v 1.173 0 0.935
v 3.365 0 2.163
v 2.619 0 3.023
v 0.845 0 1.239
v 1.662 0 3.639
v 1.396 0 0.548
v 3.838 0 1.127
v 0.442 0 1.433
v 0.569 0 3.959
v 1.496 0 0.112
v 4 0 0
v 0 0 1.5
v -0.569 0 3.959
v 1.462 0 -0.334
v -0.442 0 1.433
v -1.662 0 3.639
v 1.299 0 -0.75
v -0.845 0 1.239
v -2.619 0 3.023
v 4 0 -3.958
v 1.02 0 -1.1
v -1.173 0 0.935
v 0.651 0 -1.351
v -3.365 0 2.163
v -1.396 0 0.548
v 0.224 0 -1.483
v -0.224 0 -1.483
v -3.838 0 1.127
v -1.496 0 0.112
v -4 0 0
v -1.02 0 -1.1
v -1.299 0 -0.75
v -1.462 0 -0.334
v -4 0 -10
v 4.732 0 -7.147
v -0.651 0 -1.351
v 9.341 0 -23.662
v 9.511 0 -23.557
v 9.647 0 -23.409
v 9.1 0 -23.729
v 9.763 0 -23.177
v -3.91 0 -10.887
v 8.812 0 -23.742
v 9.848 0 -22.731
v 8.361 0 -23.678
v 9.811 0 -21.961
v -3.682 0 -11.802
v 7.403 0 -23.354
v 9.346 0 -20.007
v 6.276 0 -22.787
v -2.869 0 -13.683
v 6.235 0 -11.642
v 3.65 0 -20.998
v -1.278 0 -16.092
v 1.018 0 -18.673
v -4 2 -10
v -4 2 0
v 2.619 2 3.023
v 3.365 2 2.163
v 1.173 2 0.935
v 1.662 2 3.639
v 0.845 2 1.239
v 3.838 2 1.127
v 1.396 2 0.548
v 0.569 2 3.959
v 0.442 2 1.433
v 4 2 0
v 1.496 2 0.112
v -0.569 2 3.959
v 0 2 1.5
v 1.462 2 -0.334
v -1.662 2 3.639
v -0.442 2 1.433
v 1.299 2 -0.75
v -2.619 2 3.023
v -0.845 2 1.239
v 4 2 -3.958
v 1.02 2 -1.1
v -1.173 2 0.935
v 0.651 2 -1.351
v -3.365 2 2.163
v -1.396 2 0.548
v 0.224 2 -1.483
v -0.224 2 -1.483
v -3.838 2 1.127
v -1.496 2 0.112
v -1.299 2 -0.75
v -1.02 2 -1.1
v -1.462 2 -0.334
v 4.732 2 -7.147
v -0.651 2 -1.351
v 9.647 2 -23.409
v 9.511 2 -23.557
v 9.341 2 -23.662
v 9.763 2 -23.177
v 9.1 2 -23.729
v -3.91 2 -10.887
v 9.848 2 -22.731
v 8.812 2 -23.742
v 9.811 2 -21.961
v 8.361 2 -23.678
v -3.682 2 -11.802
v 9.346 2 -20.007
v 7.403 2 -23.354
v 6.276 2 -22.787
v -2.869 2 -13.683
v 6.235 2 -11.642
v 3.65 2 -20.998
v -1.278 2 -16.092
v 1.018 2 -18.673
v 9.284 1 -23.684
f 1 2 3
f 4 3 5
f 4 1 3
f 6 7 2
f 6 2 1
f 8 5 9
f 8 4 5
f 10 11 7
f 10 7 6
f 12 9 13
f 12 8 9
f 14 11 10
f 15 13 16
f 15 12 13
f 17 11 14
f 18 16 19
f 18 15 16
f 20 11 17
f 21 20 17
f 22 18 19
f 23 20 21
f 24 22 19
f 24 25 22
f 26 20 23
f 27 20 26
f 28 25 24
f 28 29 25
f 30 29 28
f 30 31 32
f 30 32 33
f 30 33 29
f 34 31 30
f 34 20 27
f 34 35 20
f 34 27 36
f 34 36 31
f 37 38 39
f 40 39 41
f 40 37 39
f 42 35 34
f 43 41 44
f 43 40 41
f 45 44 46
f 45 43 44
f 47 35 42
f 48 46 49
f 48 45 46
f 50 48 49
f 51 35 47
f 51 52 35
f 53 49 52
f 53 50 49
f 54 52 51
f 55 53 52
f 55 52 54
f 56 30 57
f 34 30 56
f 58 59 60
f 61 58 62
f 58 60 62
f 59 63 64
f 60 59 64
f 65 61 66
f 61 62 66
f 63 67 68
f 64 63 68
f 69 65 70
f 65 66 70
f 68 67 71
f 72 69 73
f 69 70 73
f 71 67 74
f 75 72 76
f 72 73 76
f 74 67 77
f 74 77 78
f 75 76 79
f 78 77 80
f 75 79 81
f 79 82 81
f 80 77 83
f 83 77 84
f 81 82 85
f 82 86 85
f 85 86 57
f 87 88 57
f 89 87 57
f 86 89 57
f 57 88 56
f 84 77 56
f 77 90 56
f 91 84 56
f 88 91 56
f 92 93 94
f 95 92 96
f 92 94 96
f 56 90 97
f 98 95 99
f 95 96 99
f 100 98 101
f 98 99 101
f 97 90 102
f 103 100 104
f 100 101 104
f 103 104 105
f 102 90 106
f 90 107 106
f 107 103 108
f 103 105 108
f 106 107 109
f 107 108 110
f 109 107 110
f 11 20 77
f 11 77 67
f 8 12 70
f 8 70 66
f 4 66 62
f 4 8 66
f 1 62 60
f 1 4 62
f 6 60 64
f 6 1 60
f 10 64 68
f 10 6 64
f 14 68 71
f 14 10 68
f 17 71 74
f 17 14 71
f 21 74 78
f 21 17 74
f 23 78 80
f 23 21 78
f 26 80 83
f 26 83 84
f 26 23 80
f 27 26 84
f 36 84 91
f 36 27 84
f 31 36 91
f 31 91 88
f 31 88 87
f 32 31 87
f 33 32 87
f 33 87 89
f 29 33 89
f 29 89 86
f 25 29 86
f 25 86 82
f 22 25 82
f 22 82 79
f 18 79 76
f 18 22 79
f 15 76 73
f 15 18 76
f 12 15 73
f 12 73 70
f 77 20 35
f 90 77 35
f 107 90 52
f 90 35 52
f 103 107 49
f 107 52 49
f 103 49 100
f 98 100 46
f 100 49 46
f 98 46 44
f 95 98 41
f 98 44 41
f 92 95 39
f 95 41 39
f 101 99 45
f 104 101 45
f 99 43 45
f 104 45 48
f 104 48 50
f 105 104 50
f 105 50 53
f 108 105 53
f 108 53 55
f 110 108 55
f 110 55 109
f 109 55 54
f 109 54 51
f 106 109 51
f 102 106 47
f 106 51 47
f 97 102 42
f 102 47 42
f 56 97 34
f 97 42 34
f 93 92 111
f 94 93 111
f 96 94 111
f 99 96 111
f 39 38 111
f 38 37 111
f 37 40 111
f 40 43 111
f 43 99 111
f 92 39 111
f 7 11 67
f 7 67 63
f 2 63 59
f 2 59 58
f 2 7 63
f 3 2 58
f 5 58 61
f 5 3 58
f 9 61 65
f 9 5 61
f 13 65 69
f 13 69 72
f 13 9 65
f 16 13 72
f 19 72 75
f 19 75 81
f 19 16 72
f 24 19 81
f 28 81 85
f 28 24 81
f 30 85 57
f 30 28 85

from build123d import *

# Parameters (mm, degrees)
SKETCH_1_R      = 1.5
EXTRUDE_1_DEPTH = 2


with BuildPart() as part:
    # 草图1 → 凸台-拉伸1 (new body)
    with BuildSketch(Plane(origin=(0, 0, 0), x_dir=(1, 0, 0), z_dir=(0, 1, 0))):
        with BuildLine():
            Line((4, 3.957584735), (4, 0))
            ThreePointArc((4, 0), (0, -4), (-4, 0))
            Line((-4, 0), (-4, 10))
            add(Edge.make_bspline(
                [(4, 3.957584735), (5.220328821, 11.617864449), (18.105099326, 33.482498229), (-3.879182843, 15.981547528), (-4, 10)],
                knots=[0.090091428, 0.090091428, 0.090091428, 0.090091428, 0.554982664, 1, 1, 1, 1], degree=3))
        make_face()
        with Locations(Location((0, 0, 0), (0, 0, 270))):
            Circle(SKETCH_1_R, mode=Mode.SUBTRACT)
    extrude(amount=EXTRUDE_1_DEPTH)


solid = part.part
